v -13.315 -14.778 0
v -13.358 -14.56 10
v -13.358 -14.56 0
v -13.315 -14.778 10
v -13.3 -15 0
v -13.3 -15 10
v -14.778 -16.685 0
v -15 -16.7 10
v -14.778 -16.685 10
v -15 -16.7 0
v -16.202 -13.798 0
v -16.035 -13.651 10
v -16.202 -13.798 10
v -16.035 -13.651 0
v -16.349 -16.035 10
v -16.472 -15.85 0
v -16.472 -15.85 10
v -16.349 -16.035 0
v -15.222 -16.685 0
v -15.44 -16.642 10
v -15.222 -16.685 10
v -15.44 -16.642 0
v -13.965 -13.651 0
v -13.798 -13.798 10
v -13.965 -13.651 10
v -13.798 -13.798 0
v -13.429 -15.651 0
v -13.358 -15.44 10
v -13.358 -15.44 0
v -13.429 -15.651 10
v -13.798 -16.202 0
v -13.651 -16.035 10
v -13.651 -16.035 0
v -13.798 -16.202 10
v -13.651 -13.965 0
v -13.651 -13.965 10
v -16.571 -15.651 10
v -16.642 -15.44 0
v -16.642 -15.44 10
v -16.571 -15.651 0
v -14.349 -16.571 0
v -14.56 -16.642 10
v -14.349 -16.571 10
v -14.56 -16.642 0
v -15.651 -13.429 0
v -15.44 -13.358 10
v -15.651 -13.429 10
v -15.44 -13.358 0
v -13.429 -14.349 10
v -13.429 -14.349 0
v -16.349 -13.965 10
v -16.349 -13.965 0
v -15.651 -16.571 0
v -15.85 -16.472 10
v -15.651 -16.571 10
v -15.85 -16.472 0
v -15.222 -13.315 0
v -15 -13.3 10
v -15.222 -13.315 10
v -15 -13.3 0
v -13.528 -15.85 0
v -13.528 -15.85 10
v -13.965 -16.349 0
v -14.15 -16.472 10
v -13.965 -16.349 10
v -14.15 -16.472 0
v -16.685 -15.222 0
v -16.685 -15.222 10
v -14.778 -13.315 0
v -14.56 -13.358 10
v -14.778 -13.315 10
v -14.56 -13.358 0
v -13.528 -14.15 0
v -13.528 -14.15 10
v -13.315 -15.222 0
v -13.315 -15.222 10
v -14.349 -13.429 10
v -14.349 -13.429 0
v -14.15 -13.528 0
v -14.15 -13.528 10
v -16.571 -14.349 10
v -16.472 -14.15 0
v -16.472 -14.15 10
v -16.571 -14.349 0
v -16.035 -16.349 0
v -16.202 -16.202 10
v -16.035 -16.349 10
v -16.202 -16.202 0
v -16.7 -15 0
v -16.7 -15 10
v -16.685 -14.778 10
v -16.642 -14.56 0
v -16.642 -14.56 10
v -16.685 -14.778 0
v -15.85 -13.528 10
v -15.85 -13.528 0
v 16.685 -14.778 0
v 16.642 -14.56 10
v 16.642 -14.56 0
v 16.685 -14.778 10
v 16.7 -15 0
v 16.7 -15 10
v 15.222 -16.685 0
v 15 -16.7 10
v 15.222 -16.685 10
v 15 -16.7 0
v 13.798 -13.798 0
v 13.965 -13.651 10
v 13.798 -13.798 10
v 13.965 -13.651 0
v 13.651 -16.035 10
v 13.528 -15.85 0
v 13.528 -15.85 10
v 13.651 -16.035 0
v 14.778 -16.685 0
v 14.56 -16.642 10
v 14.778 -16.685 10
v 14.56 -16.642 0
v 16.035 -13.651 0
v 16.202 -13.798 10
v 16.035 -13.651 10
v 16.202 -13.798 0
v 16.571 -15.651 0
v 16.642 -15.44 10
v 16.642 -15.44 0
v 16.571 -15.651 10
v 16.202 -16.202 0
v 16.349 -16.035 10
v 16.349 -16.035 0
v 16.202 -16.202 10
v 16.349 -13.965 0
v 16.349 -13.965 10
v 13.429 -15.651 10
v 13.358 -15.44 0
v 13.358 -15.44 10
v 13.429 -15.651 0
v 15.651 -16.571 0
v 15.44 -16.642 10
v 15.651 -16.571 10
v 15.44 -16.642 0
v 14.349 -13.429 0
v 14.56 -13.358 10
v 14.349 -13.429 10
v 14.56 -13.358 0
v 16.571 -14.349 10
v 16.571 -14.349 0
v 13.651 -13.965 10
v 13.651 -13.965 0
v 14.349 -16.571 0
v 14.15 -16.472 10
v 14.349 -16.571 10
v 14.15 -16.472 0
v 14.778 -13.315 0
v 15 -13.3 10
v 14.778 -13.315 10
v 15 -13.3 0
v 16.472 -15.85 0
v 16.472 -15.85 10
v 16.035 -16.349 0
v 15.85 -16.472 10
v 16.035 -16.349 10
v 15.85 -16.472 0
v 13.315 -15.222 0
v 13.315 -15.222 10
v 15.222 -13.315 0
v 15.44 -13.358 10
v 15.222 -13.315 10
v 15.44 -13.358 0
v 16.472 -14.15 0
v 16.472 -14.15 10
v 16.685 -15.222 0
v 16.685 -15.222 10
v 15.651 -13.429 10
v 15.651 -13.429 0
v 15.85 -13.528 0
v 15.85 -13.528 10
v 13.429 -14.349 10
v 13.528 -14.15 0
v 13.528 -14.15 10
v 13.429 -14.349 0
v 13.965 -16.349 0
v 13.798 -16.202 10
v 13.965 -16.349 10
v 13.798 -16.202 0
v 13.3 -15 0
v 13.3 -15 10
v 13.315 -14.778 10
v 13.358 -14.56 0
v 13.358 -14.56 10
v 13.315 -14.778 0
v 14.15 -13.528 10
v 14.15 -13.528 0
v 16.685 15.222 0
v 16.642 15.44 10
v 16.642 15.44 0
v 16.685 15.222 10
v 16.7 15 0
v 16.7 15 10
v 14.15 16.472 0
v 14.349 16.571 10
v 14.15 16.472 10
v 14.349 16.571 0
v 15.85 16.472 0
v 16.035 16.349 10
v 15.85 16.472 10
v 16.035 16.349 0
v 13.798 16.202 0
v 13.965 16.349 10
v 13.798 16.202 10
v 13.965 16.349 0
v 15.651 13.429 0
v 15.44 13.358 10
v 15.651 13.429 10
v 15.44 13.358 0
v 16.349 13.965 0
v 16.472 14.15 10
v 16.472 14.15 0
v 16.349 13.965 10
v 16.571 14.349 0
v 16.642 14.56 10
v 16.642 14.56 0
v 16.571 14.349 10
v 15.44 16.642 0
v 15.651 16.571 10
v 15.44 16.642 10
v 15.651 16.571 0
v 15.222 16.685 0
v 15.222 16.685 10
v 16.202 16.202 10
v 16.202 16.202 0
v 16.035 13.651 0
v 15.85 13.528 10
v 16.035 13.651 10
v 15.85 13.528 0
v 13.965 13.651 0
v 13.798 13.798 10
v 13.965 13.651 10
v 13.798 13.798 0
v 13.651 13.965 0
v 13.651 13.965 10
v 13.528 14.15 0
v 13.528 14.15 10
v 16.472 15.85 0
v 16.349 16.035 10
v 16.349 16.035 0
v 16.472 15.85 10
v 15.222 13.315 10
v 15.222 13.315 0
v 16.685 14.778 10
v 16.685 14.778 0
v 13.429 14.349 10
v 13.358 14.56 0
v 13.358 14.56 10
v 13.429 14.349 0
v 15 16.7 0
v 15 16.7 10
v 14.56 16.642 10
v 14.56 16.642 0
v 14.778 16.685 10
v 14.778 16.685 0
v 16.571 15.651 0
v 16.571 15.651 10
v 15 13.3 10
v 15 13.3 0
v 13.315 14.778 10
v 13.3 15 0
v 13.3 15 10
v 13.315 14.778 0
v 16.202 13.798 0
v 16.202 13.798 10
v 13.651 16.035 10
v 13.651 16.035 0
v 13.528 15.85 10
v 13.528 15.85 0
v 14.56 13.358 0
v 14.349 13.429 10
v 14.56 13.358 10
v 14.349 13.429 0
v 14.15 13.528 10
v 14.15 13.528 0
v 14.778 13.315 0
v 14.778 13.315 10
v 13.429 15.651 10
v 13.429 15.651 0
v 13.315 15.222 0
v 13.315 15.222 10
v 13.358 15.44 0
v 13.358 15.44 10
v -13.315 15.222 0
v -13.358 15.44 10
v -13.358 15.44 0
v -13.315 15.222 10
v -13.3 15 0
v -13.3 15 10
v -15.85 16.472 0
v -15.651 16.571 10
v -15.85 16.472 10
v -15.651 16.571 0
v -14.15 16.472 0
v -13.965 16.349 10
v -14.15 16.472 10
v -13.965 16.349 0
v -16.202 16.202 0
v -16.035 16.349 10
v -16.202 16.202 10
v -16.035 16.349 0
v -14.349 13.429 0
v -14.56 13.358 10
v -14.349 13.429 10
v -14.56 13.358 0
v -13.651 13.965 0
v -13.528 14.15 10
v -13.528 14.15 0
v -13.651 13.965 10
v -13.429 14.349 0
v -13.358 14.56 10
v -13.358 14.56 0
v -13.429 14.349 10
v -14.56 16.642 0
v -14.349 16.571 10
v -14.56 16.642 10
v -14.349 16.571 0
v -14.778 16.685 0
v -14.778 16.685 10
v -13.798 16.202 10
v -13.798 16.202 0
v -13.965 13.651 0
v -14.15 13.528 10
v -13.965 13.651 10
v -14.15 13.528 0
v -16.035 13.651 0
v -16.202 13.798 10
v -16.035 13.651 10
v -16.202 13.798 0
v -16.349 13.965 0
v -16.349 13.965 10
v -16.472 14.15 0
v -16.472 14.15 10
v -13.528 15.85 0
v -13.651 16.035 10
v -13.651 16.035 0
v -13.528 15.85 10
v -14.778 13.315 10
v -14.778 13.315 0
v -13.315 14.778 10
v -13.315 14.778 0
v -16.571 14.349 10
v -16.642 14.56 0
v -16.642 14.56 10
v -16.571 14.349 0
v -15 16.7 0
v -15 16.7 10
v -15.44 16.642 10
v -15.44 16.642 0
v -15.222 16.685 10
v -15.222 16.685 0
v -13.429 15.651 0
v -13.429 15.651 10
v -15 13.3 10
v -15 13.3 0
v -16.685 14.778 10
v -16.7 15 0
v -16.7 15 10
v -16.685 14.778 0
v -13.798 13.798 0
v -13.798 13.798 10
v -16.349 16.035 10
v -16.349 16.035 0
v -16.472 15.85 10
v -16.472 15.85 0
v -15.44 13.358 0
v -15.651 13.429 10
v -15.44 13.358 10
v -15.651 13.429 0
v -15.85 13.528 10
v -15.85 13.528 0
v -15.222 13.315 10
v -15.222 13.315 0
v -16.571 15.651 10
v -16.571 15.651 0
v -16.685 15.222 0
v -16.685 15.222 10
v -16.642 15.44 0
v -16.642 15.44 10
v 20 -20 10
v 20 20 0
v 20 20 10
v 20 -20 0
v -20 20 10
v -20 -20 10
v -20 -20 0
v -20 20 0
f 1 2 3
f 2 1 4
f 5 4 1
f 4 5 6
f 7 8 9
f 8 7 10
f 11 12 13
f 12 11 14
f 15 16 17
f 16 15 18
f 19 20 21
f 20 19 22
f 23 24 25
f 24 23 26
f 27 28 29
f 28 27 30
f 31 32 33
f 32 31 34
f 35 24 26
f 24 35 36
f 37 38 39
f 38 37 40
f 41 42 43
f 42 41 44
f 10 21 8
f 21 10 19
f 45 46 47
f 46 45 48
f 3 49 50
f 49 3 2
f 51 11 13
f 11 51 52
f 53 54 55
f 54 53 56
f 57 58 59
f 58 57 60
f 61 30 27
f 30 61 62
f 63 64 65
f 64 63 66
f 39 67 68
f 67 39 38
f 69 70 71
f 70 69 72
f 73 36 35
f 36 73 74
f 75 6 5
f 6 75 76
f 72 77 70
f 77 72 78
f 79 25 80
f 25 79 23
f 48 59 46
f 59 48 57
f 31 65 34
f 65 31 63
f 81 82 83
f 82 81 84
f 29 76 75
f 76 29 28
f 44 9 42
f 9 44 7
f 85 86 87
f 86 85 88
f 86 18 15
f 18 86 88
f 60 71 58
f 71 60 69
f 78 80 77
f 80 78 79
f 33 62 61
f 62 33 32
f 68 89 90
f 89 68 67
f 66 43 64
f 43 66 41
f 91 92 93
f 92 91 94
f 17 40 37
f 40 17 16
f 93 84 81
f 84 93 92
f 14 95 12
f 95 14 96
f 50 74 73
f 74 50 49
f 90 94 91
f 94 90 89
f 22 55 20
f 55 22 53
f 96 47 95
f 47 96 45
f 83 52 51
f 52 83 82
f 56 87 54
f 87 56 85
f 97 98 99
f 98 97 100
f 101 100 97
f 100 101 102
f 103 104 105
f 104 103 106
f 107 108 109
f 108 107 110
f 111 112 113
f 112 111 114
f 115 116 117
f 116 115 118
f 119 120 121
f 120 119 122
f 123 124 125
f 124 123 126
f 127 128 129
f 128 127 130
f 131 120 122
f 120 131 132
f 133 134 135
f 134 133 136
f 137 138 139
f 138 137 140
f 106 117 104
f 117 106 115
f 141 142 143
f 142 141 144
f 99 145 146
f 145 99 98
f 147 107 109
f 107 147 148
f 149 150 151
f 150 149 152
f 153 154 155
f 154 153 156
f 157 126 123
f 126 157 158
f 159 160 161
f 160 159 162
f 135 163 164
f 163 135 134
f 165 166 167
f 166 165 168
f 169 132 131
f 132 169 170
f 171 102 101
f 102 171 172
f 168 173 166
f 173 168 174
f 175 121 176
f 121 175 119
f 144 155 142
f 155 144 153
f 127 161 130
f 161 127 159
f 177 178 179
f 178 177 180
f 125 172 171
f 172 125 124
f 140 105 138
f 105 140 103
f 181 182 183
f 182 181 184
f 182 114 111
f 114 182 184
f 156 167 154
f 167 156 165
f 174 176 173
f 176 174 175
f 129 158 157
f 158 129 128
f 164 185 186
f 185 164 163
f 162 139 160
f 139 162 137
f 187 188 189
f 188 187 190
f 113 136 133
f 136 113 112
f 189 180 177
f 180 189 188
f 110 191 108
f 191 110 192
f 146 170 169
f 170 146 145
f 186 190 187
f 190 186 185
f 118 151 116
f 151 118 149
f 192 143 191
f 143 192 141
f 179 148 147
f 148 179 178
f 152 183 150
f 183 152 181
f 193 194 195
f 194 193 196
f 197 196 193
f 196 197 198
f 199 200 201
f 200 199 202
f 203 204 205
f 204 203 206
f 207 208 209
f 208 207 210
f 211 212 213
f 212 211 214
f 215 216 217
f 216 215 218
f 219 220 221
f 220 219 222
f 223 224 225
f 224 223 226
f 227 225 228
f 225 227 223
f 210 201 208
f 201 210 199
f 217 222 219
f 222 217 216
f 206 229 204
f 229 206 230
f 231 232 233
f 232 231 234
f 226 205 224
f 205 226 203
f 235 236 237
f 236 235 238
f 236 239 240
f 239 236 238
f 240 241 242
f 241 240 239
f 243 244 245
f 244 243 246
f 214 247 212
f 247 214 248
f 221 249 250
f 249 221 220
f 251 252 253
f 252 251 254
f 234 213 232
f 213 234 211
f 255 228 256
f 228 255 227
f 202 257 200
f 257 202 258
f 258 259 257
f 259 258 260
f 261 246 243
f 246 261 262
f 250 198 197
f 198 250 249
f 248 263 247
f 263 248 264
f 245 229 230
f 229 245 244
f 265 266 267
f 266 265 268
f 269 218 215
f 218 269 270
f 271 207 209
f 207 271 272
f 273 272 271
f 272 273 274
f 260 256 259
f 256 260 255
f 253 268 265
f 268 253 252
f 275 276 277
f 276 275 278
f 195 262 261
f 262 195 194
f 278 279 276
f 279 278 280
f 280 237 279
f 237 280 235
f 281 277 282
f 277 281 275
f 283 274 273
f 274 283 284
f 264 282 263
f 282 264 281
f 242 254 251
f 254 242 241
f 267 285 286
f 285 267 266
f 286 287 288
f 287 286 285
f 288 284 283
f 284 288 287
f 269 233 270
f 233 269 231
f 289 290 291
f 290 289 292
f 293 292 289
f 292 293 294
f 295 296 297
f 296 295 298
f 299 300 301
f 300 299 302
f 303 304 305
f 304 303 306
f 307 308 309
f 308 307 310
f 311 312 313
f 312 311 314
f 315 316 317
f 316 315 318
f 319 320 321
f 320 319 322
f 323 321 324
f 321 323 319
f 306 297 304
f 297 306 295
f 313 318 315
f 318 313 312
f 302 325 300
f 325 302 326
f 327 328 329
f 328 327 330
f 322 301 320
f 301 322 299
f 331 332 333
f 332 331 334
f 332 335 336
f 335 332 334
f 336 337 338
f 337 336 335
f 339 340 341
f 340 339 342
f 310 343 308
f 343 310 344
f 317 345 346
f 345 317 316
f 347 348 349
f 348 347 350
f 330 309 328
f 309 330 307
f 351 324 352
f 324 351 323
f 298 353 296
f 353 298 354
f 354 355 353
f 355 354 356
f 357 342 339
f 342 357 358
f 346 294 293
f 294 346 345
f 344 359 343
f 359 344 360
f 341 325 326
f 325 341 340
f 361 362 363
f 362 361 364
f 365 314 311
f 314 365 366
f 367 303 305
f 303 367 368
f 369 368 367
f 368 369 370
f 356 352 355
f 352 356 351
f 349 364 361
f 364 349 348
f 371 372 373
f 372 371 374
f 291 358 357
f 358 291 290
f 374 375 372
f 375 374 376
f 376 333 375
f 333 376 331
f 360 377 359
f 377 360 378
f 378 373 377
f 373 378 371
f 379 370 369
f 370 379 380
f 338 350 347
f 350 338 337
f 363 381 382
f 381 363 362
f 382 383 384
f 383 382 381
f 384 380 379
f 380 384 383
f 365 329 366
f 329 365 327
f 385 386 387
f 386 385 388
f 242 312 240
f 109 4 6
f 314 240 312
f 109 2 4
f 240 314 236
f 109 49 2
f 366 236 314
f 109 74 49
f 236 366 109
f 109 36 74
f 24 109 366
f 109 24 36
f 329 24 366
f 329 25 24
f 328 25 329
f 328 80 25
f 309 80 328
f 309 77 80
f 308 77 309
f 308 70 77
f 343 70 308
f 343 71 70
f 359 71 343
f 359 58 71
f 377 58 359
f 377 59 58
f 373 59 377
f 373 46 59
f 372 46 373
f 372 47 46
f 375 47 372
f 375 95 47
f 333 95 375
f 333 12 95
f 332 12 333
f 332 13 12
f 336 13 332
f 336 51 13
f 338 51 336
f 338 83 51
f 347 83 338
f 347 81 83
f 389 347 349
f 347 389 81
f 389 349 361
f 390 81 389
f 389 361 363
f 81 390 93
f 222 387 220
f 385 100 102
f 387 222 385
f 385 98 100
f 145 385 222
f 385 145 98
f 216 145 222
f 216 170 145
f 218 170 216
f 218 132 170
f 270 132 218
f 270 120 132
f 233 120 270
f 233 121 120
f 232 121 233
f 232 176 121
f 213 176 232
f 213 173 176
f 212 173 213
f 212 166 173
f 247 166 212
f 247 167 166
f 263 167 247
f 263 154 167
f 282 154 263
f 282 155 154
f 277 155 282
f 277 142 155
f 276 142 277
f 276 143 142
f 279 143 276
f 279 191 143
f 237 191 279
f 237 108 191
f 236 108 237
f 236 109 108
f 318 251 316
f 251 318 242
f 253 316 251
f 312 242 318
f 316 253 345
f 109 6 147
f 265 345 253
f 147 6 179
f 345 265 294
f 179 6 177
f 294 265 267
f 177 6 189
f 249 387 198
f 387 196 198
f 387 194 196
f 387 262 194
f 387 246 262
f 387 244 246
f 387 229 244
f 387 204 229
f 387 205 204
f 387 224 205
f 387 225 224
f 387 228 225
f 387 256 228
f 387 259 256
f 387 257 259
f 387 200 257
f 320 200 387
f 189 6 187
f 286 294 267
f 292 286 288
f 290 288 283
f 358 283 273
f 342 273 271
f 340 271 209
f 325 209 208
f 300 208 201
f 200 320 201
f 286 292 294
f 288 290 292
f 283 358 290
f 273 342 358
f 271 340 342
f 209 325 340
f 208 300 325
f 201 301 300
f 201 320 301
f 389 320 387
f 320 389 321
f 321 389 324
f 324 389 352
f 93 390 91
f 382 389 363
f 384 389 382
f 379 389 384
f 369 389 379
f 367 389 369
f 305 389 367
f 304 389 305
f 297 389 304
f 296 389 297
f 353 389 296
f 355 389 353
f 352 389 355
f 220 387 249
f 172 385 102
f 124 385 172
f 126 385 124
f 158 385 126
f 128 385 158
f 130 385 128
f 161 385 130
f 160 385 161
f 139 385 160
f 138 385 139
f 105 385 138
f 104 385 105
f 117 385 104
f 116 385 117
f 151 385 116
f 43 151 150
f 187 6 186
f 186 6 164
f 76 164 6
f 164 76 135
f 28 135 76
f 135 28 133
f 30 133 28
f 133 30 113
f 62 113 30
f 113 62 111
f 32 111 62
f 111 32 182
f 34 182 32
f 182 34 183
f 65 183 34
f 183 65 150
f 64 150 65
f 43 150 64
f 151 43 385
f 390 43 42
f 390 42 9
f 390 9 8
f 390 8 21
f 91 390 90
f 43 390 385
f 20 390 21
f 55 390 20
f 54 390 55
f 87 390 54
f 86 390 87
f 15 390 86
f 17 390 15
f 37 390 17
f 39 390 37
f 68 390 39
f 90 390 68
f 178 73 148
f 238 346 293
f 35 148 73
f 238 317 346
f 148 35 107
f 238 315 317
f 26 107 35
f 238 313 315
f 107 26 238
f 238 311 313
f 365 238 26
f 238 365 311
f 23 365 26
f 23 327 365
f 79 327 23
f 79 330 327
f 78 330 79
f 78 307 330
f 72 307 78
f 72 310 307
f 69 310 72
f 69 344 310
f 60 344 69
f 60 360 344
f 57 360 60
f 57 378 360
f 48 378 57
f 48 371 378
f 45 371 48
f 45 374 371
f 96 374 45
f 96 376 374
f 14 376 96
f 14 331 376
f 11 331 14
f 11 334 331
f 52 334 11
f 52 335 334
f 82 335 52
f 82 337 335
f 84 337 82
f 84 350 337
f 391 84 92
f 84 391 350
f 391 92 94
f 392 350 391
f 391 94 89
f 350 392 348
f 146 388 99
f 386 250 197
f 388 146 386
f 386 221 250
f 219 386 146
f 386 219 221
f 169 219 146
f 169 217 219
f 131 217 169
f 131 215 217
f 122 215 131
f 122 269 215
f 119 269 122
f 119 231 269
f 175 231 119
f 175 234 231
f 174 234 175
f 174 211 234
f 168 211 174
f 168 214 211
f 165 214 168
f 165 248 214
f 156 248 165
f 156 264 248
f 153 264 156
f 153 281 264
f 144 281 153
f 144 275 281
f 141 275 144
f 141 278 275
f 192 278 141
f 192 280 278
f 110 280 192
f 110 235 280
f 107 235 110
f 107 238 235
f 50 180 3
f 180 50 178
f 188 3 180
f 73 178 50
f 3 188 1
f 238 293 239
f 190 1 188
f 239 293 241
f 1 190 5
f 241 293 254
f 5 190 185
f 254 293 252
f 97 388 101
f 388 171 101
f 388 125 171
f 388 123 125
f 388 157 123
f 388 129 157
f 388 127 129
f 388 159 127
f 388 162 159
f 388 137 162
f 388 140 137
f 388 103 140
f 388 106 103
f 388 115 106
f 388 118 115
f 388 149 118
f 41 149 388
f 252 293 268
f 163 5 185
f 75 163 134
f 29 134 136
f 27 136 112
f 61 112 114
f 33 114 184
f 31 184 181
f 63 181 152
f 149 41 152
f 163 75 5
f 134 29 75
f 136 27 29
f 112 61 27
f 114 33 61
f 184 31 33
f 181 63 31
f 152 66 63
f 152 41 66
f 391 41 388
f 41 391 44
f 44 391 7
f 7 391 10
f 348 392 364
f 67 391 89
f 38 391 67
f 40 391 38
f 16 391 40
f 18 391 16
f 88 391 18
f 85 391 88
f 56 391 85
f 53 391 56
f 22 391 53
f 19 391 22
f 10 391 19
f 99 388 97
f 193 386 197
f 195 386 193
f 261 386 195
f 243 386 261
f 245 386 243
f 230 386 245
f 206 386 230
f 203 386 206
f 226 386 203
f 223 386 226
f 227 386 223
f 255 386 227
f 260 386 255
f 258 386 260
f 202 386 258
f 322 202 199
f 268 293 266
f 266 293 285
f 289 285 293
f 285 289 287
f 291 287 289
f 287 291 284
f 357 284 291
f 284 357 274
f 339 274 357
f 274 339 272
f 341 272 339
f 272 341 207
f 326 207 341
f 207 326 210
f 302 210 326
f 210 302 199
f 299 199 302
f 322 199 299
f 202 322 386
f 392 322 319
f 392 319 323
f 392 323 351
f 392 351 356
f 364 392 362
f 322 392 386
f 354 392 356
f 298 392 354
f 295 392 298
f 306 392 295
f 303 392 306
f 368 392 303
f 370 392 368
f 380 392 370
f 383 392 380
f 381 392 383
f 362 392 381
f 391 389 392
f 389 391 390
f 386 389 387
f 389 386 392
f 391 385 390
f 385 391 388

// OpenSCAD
// SPDX-License-Identifier: CC-BY-NC-SA-4.0
// __NAME__ library.
// Multi-role component convention (see docs/LIBRARY-AUTHORING.md):
//   1. Data        — functions returning constants / [x,y] coord lists
//                    (expose as functions: OpenSCAD `use` does not import variables)
//   2. Placeholder — __IDENT___placeholder(): envelope solid for fit checks
//   3. Hole-stamp  — __IDENT___holes(): mounting holes for a consumer difference()
// Conventions: centered origin X/Y, bottom face on Z=0; clearances from named
// functions; millimeters; central $fn. Provenance: tag each value [A]/[B]/[C]
// with a source; use //VERIFY for weak/unconfirmed values.
// Pure-data libraries (data functions only, no geometry) keep ONLY the Data functions below and
// delete the placeholder/holes modules.

$fn = 48;

/* [Data] */
function __IDENT___width()  = 40;   // mm, X envelope   // [tier] <source>
function __IDENT___depth()  = 40;   // mm, Y envelope   // [tier] <source>
function __IDENT___height() = 10;   // mm, Z envelope   // [tier] <source>
// Mounting-hole coordinates [x, y], relative to the centered origin.
function __IDENT___holes_xy() = [[-15, -15], [15, -15], [15, 15], [-15, 15]];
function __IDENT___hole_dia() = 3.4; // mm, clearance hole   // [tier] <source>

/* [Placeholder] */
// Envelope solid for dropping into an assembly to check fit.
module __IDENT___placeholder() {
    translate([0, 0, __IDENT___height() / 2])
        cube([__IDENT___width(), __IDENT___depth(), __IDENT___height()], center = true);
}

/* [Hole-stamp] */
// Mounting holes; use inside a consumer difference().
module __IDENT___holes(depth = -1) {
    h = depth < 0 ? __IDENT___height() + 2 : depth;
    for (p = __IDENT___holes_xy())
        translate([p[0], p[1], -1])
            cylinder(h = h, d = __IDENT___hole_dia());
}

// Visual self-check when opened directly.
difference() {
    __IDENT___placeholder();
    __IDENT___holes();
}
